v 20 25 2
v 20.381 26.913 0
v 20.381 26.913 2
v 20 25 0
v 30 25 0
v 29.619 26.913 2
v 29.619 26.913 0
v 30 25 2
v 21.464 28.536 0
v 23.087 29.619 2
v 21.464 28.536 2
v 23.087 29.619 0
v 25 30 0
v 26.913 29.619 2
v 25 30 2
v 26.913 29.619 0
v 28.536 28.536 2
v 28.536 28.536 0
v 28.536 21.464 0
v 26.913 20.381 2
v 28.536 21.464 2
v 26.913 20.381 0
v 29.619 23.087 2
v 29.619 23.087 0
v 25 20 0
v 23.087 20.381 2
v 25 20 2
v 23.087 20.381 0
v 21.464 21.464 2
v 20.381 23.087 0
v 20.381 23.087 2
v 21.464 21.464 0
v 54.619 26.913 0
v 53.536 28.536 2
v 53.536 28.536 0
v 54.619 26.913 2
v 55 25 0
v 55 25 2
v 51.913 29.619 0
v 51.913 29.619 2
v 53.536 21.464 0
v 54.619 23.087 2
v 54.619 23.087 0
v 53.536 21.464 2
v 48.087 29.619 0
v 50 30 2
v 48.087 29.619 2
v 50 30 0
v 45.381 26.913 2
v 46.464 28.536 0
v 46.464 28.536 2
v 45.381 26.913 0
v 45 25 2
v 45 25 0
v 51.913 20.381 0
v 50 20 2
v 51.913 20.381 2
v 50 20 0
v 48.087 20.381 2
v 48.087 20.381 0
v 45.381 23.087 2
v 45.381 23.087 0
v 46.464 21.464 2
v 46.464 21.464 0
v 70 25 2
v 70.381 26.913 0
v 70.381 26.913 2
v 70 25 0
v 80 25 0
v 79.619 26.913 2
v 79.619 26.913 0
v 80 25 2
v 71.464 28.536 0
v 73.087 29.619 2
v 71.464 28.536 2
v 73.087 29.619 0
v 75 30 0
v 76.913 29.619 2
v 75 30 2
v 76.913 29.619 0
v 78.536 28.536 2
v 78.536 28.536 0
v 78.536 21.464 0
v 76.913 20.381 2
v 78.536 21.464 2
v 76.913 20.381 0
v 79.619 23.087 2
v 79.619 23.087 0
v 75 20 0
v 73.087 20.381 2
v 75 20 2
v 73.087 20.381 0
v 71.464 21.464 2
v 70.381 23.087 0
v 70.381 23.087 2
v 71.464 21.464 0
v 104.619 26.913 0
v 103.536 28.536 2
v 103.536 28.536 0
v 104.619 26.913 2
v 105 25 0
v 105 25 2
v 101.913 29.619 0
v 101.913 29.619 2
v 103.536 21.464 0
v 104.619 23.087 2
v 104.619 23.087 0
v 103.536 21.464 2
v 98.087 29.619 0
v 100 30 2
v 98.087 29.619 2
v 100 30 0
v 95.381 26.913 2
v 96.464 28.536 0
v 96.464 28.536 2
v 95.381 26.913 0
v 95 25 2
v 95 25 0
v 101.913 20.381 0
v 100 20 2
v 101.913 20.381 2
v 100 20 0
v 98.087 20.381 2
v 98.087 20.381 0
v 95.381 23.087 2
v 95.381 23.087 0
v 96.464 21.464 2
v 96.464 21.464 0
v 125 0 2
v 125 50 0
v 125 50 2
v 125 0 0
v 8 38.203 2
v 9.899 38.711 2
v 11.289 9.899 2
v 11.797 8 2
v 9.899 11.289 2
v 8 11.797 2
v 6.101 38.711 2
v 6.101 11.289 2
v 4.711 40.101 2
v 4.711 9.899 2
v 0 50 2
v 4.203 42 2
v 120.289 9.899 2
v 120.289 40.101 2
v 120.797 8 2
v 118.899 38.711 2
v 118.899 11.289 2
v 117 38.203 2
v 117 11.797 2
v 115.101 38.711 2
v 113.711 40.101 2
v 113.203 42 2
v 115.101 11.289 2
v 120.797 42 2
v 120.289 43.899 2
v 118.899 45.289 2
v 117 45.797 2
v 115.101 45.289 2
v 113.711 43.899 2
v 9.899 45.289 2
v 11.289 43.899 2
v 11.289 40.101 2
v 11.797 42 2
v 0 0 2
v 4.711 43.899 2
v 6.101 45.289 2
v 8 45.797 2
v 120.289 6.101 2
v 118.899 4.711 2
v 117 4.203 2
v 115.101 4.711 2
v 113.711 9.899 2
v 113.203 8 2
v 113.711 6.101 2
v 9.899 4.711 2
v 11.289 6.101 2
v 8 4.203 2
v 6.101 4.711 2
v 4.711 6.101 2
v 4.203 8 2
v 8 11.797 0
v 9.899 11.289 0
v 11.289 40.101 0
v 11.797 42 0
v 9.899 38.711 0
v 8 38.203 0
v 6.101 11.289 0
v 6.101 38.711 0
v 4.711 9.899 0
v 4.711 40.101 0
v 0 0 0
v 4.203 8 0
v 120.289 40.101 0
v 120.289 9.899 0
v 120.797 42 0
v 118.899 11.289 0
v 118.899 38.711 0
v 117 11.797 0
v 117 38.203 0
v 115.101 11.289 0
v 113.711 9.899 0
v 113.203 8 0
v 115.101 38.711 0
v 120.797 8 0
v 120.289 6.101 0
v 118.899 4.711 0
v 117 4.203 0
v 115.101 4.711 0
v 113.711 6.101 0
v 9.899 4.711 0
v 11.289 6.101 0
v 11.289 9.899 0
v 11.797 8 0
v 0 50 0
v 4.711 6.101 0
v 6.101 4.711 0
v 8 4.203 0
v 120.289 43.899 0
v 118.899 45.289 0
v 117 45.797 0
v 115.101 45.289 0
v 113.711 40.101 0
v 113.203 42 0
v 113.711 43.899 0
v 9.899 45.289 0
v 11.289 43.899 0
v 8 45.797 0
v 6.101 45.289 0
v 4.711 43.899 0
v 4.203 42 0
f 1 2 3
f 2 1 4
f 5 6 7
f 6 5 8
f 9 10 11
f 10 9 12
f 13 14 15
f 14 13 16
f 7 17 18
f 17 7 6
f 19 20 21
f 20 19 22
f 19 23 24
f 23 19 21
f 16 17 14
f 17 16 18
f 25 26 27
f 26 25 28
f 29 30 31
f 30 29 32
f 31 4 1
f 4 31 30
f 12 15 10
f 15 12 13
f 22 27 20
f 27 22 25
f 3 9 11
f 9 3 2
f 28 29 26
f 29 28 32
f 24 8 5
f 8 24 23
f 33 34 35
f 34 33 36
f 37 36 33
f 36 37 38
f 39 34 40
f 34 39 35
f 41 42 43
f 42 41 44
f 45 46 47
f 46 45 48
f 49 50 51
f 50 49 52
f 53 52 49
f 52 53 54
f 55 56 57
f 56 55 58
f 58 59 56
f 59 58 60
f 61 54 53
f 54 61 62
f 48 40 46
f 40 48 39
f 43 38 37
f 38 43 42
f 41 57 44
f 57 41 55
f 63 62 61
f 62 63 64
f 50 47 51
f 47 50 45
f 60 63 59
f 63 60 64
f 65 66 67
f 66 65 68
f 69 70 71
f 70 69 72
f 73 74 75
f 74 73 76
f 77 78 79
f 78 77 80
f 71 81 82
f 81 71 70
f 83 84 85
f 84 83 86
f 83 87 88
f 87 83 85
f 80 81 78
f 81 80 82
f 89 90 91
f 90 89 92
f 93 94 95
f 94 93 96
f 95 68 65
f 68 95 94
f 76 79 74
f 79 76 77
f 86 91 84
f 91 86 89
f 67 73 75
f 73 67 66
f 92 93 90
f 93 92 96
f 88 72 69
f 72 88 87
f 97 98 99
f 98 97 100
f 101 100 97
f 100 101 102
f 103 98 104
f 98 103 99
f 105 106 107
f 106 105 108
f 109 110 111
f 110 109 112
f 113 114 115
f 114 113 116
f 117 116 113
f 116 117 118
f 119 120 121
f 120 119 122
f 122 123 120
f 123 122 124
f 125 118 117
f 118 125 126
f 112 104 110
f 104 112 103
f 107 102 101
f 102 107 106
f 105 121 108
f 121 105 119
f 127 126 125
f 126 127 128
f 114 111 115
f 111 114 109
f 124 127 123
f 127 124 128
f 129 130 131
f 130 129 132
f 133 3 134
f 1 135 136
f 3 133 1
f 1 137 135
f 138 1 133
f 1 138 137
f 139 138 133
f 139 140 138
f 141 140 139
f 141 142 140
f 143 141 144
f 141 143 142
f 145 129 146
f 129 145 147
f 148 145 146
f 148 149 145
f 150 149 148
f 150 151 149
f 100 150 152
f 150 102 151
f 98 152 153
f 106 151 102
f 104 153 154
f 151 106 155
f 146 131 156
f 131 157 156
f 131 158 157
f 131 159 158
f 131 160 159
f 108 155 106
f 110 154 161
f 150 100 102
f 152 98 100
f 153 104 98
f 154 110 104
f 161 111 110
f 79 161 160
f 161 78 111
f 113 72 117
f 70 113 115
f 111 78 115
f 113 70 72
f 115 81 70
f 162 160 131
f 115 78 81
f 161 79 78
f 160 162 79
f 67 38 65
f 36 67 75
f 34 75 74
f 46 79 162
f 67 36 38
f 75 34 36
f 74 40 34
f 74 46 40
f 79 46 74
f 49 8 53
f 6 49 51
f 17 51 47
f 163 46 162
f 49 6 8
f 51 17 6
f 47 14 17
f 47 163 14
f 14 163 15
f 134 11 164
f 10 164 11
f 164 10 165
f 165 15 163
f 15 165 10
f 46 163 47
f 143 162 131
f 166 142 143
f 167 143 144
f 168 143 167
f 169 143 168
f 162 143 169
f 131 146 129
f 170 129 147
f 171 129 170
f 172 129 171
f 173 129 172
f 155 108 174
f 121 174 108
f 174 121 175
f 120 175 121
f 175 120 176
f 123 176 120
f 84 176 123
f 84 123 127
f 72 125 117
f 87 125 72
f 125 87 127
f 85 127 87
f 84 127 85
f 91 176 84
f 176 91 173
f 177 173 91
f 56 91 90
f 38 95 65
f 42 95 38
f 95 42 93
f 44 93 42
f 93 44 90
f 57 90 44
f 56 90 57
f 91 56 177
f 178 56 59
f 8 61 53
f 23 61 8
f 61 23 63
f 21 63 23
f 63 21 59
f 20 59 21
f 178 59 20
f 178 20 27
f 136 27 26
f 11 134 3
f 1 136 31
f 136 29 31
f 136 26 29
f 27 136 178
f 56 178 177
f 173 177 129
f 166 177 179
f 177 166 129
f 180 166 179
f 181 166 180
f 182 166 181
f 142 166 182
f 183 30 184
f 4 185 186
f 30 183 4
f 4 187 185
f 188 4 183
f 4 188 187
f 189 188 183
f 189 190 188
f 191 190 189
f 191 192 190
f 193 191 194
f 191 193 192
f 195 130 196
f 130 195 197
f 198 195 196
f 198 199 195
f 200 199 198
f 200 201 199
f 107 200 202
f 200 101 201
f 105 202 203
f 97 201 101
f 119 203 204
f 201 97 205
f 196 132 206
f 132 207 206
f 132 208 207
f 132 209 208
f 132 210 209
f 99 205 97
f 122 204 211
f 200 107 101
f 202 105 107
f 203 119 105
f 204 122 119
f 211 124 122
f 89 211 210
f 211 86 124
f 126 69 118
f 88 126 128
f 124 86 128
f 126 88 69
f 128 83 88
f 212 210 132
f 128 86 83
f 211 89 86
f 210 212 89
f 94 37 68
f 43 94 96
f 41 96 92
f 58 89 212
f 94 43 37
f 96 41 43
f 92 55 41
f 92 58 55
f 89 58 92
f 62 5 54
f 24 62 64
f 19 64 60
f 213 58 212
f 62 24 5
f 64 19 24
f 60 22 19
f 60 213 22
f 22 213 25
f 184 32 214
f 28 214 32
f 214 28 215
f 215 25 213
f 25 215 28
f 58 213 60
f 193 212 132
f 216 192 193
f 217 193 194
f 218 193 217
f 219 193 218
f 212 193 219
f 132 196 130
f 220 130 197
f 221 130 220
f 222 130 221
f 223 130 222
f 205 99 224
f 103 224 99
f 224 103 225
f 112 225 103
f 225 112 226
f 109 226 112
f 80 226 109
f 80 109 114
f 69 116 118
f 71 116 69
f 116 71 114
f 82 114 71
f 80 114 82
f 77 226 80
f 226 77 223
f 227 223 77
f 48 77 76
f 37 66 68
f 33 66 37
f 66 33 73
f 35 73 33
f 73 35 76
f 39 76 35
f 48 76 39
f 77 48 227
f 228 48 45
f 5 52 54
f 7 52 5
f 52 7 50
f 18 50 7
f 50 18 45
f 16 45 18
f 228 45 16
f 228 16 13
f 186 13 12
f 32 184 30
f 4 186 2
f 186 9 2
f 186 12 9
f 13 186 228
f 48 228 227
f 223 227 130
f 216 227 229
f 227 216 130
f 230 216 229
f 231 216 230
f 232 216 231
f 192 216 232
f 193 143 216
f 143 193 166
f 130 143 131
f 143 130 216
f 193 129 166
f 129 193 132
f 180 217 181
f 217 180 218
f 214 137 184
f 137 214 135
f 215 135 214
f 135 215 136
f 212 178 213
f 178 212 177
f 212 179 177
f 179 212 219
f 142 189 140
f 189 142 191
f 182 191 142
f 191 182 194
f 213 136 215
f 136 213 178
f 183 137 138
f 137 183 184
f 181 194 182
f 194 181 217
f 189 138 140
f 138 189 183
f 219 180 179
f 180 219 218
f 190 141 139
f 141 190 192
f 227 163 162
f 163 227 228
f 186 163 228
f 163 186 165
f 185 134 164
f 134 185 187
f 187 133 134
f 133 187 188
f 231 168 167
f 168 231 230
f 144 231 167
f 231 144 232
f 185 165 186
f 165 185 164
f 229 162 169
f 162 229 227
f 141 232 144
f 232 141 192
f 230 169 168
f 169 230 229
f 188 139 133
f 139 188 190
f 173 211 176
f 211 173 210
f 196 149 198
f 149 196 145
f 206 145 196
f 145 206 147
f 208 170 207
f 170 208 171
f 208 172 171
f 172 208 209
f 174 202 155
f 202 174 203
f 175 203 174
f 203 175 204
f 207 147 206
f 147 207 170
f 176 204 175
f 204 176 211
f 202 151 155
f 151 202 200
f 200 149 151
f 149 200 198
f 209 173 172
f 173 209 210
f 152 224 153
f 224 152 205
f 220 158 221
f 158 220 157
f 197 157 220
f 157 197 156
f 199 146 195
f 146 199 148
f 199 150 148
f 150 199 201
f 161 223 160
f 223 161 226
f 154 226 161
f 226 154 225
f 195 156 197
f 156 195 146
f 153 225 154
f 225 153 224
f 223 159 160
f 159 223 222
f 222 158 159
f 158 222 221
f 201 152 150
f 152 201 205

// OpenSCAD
panelWidth=125;
panelHeight=50;
panelThick=2;

difference() {
    cube([panelWidth,panelHeight,panelThick]);
    for (i=[1:4]) {
        translate([panelWidth/5*i,panelHeight/2,panelThick/2]) {
            cylinder(h=panelThick*2,r=5,center=true);
        }
    }
    // bolt holes #6
    translate([8,8,panelThick/2])
        cylinder(h=panelThick*2,r=0.1495*25.4,center=true);
    translate([8,panelHeight-8,panelThick/2])
        cylinder(h=panelThick*2,r=0.1495*25.4,center=true);
    translate([panelWidth-8,8,panelThick/2])
        cylinder(h=panelThick*2,r=0.1495*25.4,center=true);
    translate([panelWidth-8,panelHeight-8,panelThick/2])
        cylinder(h=panelThick*2,r=0.1495*25.4,center=true);
}
